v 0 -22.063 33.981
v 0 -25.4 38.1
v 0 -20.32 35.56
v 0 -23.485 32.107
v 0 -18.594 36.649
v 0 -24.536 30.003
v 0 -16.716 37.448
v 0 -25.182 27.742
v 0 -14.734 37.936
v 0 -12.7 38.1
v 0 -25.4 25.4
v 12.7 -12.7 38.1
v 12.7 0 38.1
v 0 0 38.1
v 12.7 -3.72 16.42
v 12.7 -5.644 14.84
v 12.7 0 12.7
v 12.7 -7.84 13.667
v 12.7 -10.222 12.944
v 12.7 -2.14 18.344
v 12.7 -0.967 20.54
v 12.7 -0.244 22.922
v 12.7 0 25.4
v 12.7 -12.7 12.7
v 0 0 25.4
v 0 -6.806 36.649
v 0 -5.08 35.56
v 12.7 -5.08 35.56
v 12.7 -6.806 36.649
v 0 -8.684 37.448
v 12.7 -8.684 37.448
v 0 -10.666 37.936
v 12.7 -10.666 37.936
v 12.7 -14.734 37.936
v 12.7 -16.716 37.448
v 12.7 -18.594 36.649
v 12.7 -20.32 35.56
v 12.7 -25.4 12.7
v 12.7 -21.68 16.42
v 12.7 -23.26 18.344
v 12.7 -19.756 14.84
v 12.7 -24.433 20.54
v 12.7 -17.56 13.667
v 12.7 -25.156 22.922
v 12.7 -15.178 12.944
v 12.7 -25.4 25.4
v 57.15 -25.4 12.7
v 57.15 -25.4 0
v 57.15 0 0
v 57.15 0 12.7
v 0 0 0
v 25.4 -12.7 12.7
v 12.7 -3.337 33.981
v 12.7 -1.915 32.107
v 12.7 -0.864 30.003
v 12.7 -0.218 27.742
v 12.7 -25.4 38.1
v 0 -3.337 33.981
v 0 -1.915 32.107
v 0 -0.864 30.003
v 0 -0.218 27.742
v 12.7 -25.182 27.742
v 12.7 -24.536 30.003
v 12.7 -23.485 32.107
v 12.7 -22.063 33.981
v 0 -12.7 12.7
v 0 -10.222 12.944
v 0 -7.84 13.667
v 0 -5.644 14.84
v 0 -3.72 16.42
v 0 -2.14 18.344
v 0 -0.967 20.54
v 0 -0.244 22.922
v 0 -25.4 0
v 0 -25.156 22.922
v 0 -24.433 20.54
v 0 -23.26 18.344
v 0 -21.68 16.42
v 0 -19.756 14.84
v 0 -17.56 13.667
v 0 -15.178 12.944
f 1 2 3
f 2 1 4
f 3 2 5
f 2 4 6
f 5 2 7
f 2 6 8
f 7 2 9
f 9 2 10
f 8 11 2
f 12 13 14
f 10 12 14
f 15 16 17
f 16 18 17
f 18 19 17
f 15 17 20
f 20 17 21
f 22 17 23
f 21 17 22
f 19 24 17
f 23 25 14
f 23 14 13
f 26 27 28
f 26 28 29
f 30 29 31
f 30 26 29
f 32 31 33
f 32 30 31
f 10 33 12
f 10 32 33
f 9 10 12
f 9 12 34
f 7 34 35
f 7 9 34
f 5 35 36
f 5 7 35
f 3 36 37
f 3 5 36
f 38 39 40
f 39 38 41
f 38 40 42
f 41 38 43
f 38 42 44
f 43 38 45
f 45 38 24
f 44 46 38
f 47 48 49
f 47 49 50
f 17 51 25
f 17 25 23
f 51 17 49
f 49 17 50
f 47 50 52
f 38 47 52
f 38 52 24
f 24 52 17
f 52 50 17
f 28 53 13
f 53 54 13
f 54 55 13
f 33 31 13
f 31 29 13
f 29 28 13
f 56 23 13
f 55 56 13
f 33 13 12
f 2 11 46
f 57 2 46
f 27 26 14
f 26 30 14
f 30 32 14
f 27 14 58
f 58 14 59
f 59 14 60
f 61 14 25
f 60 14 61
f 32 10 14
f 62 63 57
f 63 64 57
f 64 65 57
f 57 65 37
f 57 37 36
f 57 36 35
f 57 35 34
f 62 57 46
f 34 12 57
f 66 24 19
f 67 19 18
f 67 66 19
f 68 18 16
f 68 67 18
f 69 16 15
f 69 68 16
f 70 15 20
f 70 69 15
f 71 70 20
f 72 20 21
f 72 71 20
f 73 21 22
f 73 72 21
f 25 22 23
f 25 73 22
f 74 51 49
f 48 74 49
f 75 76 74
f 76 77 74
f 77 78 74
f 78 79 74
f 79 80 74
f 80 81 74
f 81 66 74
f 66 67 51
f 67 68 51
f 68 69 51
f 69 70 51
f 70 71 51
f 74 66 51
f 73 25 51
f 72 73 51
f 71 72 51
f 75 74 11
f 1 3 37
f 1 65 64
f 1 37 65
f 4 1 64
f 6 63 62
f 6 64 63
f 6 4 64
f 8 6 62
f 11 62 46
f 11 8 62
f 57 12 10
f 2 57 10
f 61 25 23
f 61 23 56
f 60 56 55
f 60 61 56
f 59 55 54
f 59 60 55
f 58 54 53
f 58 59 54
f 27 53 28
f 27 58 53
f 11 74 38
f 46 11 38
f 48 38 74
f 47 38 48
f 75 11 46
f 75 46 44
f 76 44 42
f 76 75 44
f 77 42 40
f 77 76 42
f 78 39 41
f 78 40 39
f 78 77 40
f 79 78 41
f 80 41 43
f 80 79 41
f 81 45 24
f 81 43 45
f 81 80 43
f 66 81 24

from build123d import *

# Parameters (mm, degrees)
F1_DEPTH = 25.4
F3_DEPTH = 57.151
F4_DEPTH = 25.4


with BuildPart() as f1:
    # F0 (on Front) → F1 (new body)
    with BuildSketch(Plane.XZ):
        Polygon((0, 38.1), (0, 0), (57.15, 0), (57.15, 12.7), (12.7, 12.7), (12.7, 38.1), align=None)
    extrude(amount=F1_DEPTH)

    # F2 (on Right) → F3 (cut, through all)
    with BuildSketch(Plane.YZ):
        with BuildLine():
            ThreePointArc((-5.08, 35.56), (-8.6839073716, 37.4482778852), (-12.7, 38.1))
            Line((-12.7, 38.1), (-12.7, 25.4))
            ThreePointArc((-12.7, 25.4), (-6.35, 28.575), (-5.08, 35.56))
        make_face()
        with BuildLine():
            Line((-12.7, 25.4), (-12.7, 38.1))
            ThreePointArc((-12.7, 38.1), (-16.7160926284, 37.4482778852), (-20.32, 35.56))
            ThreePointArc((-20.32, 35.56), (-19.05, 28.575), (-12.7, 25.4))
        make_face()
    extrude(amount=F3_DEPTH, mode=Mode.SUBTRACT)

    # F2 (on Right) → F4 (cut)
    with BuildSketch(Plane.YZ):
        with BuildLine():
            ThreePointArc((-5.08, 35.56), (-8.6839073716, 37.4482778852), (-12.7, 38.1))
            Line((-12.7, 38.1), (-12.7, 25.4))
            ThreePointArc((-12.7, 25.4), (-6.35, 28.575), (-5.08, 35.56))
        make_face()
        with BuildLine():
            Line((-12.7, 25.4), (-12.7, 38.1))
            ThreePointArc((-12.7, 38.1), (-16.7160926284, 37.4482778852), (-20.32, 35.56))
            ThreePointArc((-20.32, 35.56), (-19.05, 28.575), (-12.7, 25.4))
        make_face()
        with BuildLine():
            Line((0, 25.4), (-12.7, 25.4))
            Line((-12.7, 25.4), (-12.7, 12.7))
            ThreePointArc((-12.7, 12.7), (-3.7197438789, 16.4197438789), (0, 25.4))
        make_face()
        with BuildLine():
            Line((-12.7, 12.7), (-12.7, 25.4))
            Line((-12.7, 25.4), (-25.4, 25.4))
            ThreePointArc((-25.4, 25.4), (-21.6802561211, 16.4197438789), (-12.7, 12.7))
        make_face()
        with BuildLine():
            ThreePointArc((-5.08, 35.56), (-6.35, 28.575), (-12.7, 25.4))
            Line((-12.7, 25.4), (0, 25.4))
            ThreePointArc((0, 25.4), (-1.3407746743, 31.0796126628), (-5.08, 35.56))
        make_face()
        with BuildLine():
            Line((-25.4, 25.4), (-12.7, 25.4))
            ThreePointArc((-12.7, 25.4), (-19.05, 28.575), (-20.32, 35.56))
            ThreePointArc((-20.32, 35.56), (-24.0592253257, 31.0796126628), (-25.4, 25.4))
        make_face()
    extrude(amount=F4_DEPTH, mode=Mode.SUBTRACT)


solid = f1.part
